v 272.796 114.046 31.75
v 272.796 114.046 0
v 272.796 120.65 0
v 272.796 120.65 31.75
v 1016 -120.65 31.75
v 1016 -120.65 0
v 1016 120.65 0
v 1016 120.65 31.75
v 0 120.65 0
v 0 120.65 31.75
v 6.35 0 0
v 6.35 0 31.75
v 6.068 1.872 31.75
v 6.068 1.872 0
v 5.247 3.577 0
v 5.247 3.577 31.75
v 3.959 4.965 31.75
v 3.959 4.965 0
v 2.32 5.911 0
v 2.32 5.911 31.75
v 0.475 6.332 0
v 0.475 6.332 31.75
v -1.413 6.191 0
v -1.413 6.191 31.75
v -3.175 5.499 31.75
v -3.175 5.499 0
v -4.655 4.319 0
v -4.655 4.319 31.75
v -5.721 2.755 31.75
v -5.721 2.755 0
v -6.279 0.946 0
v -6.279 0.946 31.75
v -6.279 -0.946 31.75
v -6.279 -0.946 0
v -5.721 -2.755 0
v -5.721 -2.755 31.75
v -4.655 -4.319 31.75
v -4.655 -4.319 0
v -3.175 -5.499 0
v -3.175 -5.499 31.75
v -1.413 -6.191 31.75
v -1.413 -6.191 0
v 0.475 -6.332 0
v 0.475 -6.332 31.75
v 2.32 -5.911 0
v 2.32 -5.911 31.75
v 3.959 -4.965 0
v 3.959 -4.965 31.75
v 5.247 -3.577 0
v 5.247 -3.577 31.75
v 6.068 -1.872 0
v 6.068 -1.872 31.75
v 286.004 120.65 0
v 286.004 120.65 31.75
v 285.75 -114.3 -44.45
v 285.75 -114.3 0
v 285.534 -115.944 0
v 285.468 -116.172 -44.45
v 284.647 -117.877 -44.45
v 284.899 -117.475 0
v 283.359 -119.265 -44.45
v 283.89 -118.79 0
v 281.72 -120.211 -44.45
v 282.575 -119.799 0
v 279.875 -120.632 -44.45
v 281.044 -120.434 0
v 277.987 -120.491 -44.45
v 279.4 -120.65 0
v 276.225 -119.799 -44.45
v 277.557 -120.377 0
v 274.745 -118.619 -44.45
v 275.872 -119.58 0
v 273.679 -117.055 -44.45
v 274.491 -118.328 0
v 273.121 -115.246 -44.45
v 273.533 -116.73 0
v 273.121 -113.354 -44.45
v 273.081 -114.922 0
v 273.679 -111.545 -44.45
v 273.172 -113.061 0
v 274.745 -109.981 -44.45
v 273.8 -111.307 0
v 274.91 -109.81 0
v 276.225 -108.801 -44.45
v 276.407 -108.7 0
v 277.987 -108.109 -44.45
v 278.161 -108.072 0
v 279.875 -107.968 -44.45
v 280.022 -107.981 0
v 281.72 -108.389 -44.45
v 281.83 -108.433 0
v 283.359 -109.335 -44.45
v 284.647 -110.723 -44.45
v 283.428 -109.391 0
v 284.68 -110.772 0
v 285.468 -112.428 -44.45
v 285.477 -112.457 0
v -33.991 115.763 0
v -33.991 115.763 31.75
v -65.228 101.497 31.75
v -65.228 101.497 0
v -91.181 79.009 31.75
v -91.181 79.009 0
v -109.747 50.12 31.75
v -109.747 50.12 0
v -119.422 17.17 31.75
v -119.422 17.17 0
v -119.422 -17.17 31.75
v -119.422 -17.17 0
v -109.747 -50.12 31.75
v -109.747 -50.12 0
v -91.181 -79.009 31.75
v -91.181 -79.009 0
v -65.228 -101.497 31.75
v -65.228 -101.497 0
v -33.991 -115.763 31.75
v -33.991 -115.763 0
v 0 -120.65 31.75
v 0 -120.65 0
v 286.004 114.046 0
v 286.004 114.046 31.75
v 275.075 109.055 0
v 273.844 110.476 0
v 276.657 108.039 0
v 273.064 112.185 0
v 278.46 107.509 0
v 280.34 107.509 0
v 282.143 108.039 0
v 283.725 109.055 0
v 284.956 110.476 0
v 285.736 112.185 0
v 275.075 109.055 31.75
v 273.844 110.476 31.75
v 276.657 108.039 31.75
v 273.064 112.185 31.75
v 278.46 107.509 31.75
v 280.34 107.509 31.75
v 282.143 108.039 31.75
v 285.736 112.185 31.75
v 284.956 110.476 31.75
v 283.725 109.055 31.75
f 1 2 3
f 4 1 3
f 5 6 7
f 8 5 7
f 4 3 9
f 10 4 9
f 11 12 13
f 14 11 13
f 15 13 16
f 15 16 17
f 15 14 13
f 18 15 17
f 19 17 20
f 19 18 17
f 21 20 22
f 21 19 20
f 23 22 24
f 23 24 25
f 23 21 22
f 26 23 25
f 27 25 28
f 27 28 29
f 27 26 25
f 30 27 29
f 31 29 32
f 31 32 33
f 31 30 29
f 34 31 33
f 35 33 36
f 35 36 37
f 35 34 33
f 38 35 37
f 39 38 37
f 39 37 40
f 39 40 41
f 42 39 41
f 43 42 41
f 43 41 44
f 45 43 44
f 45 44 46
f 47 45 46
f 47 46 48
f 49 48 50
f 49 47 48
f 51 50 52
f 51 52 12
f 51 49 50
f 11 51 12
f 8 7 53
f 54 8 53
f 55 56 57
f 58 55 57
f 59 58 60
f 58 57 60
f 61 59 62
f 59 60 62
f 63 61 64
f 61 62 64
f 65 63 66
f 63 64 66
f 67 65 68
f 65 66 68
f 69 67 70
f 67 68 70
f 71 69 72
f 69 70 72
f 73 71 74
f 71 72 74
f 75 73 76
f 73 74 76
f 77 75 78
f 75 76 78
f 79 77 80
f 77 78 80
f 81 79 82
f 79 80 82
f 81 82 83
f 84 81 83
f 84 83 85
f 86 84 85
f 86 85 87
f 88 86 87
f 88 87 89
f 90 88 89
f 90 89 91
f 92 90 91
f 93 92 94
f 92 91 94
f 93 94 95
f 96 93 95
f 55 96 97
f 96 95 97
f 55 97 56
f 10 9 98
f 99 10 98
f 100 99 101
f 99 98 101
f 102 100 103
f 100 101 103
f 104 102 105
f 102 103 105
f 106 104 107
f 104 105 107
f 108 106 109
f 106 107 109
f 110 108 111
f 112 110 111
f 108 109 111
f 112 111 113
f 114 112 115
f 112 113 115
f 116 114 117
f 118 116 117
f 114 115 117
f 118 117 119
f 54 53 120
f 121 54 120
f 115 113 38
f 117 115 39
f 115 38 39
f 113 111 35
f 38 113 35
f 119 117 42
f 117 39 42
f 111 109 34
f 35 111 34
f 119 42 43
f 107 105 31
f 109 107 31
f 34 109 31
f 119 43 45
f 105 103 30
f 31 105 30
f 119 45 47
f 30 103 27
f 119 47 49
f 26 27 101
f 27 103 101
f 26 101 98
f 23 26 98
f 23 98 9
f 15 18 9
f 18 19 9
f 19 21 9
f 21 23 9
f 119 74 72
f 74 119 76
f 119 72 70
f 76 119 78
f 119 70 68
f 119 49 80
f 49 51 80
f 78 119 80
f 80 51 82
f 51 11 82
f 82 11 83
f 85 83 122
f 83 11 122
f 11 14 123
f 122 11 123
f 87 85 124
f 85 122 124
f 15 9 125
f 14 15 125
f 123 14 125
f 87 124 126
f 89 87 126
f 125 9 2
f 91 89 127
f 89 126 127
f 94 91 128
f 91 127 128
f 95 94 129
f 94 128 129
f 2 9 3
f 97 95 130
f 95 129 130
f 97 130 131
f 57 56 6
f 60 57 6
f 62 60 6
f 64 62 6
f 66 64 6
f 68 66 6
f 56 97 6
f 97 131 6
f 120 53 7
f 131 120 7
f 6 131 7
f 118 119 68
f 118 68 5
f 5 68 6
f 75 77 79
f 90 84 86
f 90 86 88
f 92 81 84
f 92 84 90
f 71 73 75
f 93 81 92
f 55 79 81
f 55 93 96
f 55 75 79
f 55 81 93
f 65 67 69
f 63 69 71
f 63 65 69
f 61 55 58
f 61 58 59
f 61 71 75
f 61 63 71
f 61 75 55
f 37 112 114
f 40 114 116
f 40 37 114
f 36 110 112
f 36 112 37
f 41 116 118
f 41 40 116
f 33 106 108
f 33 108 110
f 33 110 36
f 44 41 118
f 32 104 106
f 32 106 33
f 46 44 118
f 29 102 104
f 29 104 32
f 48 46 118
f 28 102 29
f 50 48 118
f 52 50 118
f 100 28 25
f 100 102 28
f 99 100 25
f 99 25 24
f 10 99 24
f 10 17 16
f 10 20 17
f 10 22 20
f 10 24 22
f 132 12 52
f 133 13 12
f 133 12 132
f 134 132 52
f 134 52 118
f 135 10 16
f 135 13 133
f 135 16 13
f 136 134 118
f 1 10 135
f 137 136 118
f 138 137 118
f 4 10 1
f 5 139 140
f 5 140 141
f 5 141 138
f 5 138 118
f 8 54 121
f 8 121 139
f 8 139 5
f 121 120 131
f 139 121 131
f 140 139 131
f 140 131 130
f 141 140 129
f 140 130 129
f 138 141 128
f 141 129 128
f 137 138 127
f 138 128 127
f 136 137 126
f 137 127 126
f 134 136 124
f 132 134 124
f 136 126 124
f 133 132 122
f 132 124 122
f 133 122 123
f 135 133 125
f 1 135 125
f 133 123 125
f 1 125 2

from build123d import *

# Parameters (mm, degrees)
F0_R     = 6.35
F1_DEPTH = 31.75
F2_R     = 6.35
F3_DEPTH = 44.45
F5_DEPTH = 31.75


with BuildPart() as f1:
    # F0 (on Top) → F1 (new body)
    with BuildSketch(Plane.XY):
        with BuildLine():
            Line((1016, 120.65), (0, 120.65))
            ThreePointArc((0, 120.65), (-120.65, 0), (0, -120.65))
            Line((0, -120.65), (1016, -120.65))
            Line((1016, -120.65), (1016, 120.65))
        make_face()
        Circle(F0_R, mode=Mode.SUBTRACT)
    extrude(amount=F1_DEPTH)

    # F2 (on face) → F3 (join)
    with BuildSketch(Plane(origin=(0, 0, 0), x_dir=(1, 0, 0), z_dir=(0, 0, -1))):
        with Locations((279.4, 114.3)):
            Circle(F2_R)
    extrude(amount=F3_DEPTH)

    # F4 (on face) → F5 (cut)
    with BuildSketch(Plane(origin=(0, 0, 0), x_dir=(1, 0, 0), z_dir=(0, 0, -1))):
        with BuildLine():
            Line((286.004, -120.65), (286.004, -114.046))
            ThreePointArc((286.004, -114.046), (279.4, -107.442), (272.796, -114.046))
            Line((272.796, -114.046), (272.796, -120.65))
            Line((272.796, -120.65), (286.004, -120.65))
        make_face()
    extrude(amount=-F5_DEPTH, mode=Mode.SUBTRACT)


solid = f1.part
